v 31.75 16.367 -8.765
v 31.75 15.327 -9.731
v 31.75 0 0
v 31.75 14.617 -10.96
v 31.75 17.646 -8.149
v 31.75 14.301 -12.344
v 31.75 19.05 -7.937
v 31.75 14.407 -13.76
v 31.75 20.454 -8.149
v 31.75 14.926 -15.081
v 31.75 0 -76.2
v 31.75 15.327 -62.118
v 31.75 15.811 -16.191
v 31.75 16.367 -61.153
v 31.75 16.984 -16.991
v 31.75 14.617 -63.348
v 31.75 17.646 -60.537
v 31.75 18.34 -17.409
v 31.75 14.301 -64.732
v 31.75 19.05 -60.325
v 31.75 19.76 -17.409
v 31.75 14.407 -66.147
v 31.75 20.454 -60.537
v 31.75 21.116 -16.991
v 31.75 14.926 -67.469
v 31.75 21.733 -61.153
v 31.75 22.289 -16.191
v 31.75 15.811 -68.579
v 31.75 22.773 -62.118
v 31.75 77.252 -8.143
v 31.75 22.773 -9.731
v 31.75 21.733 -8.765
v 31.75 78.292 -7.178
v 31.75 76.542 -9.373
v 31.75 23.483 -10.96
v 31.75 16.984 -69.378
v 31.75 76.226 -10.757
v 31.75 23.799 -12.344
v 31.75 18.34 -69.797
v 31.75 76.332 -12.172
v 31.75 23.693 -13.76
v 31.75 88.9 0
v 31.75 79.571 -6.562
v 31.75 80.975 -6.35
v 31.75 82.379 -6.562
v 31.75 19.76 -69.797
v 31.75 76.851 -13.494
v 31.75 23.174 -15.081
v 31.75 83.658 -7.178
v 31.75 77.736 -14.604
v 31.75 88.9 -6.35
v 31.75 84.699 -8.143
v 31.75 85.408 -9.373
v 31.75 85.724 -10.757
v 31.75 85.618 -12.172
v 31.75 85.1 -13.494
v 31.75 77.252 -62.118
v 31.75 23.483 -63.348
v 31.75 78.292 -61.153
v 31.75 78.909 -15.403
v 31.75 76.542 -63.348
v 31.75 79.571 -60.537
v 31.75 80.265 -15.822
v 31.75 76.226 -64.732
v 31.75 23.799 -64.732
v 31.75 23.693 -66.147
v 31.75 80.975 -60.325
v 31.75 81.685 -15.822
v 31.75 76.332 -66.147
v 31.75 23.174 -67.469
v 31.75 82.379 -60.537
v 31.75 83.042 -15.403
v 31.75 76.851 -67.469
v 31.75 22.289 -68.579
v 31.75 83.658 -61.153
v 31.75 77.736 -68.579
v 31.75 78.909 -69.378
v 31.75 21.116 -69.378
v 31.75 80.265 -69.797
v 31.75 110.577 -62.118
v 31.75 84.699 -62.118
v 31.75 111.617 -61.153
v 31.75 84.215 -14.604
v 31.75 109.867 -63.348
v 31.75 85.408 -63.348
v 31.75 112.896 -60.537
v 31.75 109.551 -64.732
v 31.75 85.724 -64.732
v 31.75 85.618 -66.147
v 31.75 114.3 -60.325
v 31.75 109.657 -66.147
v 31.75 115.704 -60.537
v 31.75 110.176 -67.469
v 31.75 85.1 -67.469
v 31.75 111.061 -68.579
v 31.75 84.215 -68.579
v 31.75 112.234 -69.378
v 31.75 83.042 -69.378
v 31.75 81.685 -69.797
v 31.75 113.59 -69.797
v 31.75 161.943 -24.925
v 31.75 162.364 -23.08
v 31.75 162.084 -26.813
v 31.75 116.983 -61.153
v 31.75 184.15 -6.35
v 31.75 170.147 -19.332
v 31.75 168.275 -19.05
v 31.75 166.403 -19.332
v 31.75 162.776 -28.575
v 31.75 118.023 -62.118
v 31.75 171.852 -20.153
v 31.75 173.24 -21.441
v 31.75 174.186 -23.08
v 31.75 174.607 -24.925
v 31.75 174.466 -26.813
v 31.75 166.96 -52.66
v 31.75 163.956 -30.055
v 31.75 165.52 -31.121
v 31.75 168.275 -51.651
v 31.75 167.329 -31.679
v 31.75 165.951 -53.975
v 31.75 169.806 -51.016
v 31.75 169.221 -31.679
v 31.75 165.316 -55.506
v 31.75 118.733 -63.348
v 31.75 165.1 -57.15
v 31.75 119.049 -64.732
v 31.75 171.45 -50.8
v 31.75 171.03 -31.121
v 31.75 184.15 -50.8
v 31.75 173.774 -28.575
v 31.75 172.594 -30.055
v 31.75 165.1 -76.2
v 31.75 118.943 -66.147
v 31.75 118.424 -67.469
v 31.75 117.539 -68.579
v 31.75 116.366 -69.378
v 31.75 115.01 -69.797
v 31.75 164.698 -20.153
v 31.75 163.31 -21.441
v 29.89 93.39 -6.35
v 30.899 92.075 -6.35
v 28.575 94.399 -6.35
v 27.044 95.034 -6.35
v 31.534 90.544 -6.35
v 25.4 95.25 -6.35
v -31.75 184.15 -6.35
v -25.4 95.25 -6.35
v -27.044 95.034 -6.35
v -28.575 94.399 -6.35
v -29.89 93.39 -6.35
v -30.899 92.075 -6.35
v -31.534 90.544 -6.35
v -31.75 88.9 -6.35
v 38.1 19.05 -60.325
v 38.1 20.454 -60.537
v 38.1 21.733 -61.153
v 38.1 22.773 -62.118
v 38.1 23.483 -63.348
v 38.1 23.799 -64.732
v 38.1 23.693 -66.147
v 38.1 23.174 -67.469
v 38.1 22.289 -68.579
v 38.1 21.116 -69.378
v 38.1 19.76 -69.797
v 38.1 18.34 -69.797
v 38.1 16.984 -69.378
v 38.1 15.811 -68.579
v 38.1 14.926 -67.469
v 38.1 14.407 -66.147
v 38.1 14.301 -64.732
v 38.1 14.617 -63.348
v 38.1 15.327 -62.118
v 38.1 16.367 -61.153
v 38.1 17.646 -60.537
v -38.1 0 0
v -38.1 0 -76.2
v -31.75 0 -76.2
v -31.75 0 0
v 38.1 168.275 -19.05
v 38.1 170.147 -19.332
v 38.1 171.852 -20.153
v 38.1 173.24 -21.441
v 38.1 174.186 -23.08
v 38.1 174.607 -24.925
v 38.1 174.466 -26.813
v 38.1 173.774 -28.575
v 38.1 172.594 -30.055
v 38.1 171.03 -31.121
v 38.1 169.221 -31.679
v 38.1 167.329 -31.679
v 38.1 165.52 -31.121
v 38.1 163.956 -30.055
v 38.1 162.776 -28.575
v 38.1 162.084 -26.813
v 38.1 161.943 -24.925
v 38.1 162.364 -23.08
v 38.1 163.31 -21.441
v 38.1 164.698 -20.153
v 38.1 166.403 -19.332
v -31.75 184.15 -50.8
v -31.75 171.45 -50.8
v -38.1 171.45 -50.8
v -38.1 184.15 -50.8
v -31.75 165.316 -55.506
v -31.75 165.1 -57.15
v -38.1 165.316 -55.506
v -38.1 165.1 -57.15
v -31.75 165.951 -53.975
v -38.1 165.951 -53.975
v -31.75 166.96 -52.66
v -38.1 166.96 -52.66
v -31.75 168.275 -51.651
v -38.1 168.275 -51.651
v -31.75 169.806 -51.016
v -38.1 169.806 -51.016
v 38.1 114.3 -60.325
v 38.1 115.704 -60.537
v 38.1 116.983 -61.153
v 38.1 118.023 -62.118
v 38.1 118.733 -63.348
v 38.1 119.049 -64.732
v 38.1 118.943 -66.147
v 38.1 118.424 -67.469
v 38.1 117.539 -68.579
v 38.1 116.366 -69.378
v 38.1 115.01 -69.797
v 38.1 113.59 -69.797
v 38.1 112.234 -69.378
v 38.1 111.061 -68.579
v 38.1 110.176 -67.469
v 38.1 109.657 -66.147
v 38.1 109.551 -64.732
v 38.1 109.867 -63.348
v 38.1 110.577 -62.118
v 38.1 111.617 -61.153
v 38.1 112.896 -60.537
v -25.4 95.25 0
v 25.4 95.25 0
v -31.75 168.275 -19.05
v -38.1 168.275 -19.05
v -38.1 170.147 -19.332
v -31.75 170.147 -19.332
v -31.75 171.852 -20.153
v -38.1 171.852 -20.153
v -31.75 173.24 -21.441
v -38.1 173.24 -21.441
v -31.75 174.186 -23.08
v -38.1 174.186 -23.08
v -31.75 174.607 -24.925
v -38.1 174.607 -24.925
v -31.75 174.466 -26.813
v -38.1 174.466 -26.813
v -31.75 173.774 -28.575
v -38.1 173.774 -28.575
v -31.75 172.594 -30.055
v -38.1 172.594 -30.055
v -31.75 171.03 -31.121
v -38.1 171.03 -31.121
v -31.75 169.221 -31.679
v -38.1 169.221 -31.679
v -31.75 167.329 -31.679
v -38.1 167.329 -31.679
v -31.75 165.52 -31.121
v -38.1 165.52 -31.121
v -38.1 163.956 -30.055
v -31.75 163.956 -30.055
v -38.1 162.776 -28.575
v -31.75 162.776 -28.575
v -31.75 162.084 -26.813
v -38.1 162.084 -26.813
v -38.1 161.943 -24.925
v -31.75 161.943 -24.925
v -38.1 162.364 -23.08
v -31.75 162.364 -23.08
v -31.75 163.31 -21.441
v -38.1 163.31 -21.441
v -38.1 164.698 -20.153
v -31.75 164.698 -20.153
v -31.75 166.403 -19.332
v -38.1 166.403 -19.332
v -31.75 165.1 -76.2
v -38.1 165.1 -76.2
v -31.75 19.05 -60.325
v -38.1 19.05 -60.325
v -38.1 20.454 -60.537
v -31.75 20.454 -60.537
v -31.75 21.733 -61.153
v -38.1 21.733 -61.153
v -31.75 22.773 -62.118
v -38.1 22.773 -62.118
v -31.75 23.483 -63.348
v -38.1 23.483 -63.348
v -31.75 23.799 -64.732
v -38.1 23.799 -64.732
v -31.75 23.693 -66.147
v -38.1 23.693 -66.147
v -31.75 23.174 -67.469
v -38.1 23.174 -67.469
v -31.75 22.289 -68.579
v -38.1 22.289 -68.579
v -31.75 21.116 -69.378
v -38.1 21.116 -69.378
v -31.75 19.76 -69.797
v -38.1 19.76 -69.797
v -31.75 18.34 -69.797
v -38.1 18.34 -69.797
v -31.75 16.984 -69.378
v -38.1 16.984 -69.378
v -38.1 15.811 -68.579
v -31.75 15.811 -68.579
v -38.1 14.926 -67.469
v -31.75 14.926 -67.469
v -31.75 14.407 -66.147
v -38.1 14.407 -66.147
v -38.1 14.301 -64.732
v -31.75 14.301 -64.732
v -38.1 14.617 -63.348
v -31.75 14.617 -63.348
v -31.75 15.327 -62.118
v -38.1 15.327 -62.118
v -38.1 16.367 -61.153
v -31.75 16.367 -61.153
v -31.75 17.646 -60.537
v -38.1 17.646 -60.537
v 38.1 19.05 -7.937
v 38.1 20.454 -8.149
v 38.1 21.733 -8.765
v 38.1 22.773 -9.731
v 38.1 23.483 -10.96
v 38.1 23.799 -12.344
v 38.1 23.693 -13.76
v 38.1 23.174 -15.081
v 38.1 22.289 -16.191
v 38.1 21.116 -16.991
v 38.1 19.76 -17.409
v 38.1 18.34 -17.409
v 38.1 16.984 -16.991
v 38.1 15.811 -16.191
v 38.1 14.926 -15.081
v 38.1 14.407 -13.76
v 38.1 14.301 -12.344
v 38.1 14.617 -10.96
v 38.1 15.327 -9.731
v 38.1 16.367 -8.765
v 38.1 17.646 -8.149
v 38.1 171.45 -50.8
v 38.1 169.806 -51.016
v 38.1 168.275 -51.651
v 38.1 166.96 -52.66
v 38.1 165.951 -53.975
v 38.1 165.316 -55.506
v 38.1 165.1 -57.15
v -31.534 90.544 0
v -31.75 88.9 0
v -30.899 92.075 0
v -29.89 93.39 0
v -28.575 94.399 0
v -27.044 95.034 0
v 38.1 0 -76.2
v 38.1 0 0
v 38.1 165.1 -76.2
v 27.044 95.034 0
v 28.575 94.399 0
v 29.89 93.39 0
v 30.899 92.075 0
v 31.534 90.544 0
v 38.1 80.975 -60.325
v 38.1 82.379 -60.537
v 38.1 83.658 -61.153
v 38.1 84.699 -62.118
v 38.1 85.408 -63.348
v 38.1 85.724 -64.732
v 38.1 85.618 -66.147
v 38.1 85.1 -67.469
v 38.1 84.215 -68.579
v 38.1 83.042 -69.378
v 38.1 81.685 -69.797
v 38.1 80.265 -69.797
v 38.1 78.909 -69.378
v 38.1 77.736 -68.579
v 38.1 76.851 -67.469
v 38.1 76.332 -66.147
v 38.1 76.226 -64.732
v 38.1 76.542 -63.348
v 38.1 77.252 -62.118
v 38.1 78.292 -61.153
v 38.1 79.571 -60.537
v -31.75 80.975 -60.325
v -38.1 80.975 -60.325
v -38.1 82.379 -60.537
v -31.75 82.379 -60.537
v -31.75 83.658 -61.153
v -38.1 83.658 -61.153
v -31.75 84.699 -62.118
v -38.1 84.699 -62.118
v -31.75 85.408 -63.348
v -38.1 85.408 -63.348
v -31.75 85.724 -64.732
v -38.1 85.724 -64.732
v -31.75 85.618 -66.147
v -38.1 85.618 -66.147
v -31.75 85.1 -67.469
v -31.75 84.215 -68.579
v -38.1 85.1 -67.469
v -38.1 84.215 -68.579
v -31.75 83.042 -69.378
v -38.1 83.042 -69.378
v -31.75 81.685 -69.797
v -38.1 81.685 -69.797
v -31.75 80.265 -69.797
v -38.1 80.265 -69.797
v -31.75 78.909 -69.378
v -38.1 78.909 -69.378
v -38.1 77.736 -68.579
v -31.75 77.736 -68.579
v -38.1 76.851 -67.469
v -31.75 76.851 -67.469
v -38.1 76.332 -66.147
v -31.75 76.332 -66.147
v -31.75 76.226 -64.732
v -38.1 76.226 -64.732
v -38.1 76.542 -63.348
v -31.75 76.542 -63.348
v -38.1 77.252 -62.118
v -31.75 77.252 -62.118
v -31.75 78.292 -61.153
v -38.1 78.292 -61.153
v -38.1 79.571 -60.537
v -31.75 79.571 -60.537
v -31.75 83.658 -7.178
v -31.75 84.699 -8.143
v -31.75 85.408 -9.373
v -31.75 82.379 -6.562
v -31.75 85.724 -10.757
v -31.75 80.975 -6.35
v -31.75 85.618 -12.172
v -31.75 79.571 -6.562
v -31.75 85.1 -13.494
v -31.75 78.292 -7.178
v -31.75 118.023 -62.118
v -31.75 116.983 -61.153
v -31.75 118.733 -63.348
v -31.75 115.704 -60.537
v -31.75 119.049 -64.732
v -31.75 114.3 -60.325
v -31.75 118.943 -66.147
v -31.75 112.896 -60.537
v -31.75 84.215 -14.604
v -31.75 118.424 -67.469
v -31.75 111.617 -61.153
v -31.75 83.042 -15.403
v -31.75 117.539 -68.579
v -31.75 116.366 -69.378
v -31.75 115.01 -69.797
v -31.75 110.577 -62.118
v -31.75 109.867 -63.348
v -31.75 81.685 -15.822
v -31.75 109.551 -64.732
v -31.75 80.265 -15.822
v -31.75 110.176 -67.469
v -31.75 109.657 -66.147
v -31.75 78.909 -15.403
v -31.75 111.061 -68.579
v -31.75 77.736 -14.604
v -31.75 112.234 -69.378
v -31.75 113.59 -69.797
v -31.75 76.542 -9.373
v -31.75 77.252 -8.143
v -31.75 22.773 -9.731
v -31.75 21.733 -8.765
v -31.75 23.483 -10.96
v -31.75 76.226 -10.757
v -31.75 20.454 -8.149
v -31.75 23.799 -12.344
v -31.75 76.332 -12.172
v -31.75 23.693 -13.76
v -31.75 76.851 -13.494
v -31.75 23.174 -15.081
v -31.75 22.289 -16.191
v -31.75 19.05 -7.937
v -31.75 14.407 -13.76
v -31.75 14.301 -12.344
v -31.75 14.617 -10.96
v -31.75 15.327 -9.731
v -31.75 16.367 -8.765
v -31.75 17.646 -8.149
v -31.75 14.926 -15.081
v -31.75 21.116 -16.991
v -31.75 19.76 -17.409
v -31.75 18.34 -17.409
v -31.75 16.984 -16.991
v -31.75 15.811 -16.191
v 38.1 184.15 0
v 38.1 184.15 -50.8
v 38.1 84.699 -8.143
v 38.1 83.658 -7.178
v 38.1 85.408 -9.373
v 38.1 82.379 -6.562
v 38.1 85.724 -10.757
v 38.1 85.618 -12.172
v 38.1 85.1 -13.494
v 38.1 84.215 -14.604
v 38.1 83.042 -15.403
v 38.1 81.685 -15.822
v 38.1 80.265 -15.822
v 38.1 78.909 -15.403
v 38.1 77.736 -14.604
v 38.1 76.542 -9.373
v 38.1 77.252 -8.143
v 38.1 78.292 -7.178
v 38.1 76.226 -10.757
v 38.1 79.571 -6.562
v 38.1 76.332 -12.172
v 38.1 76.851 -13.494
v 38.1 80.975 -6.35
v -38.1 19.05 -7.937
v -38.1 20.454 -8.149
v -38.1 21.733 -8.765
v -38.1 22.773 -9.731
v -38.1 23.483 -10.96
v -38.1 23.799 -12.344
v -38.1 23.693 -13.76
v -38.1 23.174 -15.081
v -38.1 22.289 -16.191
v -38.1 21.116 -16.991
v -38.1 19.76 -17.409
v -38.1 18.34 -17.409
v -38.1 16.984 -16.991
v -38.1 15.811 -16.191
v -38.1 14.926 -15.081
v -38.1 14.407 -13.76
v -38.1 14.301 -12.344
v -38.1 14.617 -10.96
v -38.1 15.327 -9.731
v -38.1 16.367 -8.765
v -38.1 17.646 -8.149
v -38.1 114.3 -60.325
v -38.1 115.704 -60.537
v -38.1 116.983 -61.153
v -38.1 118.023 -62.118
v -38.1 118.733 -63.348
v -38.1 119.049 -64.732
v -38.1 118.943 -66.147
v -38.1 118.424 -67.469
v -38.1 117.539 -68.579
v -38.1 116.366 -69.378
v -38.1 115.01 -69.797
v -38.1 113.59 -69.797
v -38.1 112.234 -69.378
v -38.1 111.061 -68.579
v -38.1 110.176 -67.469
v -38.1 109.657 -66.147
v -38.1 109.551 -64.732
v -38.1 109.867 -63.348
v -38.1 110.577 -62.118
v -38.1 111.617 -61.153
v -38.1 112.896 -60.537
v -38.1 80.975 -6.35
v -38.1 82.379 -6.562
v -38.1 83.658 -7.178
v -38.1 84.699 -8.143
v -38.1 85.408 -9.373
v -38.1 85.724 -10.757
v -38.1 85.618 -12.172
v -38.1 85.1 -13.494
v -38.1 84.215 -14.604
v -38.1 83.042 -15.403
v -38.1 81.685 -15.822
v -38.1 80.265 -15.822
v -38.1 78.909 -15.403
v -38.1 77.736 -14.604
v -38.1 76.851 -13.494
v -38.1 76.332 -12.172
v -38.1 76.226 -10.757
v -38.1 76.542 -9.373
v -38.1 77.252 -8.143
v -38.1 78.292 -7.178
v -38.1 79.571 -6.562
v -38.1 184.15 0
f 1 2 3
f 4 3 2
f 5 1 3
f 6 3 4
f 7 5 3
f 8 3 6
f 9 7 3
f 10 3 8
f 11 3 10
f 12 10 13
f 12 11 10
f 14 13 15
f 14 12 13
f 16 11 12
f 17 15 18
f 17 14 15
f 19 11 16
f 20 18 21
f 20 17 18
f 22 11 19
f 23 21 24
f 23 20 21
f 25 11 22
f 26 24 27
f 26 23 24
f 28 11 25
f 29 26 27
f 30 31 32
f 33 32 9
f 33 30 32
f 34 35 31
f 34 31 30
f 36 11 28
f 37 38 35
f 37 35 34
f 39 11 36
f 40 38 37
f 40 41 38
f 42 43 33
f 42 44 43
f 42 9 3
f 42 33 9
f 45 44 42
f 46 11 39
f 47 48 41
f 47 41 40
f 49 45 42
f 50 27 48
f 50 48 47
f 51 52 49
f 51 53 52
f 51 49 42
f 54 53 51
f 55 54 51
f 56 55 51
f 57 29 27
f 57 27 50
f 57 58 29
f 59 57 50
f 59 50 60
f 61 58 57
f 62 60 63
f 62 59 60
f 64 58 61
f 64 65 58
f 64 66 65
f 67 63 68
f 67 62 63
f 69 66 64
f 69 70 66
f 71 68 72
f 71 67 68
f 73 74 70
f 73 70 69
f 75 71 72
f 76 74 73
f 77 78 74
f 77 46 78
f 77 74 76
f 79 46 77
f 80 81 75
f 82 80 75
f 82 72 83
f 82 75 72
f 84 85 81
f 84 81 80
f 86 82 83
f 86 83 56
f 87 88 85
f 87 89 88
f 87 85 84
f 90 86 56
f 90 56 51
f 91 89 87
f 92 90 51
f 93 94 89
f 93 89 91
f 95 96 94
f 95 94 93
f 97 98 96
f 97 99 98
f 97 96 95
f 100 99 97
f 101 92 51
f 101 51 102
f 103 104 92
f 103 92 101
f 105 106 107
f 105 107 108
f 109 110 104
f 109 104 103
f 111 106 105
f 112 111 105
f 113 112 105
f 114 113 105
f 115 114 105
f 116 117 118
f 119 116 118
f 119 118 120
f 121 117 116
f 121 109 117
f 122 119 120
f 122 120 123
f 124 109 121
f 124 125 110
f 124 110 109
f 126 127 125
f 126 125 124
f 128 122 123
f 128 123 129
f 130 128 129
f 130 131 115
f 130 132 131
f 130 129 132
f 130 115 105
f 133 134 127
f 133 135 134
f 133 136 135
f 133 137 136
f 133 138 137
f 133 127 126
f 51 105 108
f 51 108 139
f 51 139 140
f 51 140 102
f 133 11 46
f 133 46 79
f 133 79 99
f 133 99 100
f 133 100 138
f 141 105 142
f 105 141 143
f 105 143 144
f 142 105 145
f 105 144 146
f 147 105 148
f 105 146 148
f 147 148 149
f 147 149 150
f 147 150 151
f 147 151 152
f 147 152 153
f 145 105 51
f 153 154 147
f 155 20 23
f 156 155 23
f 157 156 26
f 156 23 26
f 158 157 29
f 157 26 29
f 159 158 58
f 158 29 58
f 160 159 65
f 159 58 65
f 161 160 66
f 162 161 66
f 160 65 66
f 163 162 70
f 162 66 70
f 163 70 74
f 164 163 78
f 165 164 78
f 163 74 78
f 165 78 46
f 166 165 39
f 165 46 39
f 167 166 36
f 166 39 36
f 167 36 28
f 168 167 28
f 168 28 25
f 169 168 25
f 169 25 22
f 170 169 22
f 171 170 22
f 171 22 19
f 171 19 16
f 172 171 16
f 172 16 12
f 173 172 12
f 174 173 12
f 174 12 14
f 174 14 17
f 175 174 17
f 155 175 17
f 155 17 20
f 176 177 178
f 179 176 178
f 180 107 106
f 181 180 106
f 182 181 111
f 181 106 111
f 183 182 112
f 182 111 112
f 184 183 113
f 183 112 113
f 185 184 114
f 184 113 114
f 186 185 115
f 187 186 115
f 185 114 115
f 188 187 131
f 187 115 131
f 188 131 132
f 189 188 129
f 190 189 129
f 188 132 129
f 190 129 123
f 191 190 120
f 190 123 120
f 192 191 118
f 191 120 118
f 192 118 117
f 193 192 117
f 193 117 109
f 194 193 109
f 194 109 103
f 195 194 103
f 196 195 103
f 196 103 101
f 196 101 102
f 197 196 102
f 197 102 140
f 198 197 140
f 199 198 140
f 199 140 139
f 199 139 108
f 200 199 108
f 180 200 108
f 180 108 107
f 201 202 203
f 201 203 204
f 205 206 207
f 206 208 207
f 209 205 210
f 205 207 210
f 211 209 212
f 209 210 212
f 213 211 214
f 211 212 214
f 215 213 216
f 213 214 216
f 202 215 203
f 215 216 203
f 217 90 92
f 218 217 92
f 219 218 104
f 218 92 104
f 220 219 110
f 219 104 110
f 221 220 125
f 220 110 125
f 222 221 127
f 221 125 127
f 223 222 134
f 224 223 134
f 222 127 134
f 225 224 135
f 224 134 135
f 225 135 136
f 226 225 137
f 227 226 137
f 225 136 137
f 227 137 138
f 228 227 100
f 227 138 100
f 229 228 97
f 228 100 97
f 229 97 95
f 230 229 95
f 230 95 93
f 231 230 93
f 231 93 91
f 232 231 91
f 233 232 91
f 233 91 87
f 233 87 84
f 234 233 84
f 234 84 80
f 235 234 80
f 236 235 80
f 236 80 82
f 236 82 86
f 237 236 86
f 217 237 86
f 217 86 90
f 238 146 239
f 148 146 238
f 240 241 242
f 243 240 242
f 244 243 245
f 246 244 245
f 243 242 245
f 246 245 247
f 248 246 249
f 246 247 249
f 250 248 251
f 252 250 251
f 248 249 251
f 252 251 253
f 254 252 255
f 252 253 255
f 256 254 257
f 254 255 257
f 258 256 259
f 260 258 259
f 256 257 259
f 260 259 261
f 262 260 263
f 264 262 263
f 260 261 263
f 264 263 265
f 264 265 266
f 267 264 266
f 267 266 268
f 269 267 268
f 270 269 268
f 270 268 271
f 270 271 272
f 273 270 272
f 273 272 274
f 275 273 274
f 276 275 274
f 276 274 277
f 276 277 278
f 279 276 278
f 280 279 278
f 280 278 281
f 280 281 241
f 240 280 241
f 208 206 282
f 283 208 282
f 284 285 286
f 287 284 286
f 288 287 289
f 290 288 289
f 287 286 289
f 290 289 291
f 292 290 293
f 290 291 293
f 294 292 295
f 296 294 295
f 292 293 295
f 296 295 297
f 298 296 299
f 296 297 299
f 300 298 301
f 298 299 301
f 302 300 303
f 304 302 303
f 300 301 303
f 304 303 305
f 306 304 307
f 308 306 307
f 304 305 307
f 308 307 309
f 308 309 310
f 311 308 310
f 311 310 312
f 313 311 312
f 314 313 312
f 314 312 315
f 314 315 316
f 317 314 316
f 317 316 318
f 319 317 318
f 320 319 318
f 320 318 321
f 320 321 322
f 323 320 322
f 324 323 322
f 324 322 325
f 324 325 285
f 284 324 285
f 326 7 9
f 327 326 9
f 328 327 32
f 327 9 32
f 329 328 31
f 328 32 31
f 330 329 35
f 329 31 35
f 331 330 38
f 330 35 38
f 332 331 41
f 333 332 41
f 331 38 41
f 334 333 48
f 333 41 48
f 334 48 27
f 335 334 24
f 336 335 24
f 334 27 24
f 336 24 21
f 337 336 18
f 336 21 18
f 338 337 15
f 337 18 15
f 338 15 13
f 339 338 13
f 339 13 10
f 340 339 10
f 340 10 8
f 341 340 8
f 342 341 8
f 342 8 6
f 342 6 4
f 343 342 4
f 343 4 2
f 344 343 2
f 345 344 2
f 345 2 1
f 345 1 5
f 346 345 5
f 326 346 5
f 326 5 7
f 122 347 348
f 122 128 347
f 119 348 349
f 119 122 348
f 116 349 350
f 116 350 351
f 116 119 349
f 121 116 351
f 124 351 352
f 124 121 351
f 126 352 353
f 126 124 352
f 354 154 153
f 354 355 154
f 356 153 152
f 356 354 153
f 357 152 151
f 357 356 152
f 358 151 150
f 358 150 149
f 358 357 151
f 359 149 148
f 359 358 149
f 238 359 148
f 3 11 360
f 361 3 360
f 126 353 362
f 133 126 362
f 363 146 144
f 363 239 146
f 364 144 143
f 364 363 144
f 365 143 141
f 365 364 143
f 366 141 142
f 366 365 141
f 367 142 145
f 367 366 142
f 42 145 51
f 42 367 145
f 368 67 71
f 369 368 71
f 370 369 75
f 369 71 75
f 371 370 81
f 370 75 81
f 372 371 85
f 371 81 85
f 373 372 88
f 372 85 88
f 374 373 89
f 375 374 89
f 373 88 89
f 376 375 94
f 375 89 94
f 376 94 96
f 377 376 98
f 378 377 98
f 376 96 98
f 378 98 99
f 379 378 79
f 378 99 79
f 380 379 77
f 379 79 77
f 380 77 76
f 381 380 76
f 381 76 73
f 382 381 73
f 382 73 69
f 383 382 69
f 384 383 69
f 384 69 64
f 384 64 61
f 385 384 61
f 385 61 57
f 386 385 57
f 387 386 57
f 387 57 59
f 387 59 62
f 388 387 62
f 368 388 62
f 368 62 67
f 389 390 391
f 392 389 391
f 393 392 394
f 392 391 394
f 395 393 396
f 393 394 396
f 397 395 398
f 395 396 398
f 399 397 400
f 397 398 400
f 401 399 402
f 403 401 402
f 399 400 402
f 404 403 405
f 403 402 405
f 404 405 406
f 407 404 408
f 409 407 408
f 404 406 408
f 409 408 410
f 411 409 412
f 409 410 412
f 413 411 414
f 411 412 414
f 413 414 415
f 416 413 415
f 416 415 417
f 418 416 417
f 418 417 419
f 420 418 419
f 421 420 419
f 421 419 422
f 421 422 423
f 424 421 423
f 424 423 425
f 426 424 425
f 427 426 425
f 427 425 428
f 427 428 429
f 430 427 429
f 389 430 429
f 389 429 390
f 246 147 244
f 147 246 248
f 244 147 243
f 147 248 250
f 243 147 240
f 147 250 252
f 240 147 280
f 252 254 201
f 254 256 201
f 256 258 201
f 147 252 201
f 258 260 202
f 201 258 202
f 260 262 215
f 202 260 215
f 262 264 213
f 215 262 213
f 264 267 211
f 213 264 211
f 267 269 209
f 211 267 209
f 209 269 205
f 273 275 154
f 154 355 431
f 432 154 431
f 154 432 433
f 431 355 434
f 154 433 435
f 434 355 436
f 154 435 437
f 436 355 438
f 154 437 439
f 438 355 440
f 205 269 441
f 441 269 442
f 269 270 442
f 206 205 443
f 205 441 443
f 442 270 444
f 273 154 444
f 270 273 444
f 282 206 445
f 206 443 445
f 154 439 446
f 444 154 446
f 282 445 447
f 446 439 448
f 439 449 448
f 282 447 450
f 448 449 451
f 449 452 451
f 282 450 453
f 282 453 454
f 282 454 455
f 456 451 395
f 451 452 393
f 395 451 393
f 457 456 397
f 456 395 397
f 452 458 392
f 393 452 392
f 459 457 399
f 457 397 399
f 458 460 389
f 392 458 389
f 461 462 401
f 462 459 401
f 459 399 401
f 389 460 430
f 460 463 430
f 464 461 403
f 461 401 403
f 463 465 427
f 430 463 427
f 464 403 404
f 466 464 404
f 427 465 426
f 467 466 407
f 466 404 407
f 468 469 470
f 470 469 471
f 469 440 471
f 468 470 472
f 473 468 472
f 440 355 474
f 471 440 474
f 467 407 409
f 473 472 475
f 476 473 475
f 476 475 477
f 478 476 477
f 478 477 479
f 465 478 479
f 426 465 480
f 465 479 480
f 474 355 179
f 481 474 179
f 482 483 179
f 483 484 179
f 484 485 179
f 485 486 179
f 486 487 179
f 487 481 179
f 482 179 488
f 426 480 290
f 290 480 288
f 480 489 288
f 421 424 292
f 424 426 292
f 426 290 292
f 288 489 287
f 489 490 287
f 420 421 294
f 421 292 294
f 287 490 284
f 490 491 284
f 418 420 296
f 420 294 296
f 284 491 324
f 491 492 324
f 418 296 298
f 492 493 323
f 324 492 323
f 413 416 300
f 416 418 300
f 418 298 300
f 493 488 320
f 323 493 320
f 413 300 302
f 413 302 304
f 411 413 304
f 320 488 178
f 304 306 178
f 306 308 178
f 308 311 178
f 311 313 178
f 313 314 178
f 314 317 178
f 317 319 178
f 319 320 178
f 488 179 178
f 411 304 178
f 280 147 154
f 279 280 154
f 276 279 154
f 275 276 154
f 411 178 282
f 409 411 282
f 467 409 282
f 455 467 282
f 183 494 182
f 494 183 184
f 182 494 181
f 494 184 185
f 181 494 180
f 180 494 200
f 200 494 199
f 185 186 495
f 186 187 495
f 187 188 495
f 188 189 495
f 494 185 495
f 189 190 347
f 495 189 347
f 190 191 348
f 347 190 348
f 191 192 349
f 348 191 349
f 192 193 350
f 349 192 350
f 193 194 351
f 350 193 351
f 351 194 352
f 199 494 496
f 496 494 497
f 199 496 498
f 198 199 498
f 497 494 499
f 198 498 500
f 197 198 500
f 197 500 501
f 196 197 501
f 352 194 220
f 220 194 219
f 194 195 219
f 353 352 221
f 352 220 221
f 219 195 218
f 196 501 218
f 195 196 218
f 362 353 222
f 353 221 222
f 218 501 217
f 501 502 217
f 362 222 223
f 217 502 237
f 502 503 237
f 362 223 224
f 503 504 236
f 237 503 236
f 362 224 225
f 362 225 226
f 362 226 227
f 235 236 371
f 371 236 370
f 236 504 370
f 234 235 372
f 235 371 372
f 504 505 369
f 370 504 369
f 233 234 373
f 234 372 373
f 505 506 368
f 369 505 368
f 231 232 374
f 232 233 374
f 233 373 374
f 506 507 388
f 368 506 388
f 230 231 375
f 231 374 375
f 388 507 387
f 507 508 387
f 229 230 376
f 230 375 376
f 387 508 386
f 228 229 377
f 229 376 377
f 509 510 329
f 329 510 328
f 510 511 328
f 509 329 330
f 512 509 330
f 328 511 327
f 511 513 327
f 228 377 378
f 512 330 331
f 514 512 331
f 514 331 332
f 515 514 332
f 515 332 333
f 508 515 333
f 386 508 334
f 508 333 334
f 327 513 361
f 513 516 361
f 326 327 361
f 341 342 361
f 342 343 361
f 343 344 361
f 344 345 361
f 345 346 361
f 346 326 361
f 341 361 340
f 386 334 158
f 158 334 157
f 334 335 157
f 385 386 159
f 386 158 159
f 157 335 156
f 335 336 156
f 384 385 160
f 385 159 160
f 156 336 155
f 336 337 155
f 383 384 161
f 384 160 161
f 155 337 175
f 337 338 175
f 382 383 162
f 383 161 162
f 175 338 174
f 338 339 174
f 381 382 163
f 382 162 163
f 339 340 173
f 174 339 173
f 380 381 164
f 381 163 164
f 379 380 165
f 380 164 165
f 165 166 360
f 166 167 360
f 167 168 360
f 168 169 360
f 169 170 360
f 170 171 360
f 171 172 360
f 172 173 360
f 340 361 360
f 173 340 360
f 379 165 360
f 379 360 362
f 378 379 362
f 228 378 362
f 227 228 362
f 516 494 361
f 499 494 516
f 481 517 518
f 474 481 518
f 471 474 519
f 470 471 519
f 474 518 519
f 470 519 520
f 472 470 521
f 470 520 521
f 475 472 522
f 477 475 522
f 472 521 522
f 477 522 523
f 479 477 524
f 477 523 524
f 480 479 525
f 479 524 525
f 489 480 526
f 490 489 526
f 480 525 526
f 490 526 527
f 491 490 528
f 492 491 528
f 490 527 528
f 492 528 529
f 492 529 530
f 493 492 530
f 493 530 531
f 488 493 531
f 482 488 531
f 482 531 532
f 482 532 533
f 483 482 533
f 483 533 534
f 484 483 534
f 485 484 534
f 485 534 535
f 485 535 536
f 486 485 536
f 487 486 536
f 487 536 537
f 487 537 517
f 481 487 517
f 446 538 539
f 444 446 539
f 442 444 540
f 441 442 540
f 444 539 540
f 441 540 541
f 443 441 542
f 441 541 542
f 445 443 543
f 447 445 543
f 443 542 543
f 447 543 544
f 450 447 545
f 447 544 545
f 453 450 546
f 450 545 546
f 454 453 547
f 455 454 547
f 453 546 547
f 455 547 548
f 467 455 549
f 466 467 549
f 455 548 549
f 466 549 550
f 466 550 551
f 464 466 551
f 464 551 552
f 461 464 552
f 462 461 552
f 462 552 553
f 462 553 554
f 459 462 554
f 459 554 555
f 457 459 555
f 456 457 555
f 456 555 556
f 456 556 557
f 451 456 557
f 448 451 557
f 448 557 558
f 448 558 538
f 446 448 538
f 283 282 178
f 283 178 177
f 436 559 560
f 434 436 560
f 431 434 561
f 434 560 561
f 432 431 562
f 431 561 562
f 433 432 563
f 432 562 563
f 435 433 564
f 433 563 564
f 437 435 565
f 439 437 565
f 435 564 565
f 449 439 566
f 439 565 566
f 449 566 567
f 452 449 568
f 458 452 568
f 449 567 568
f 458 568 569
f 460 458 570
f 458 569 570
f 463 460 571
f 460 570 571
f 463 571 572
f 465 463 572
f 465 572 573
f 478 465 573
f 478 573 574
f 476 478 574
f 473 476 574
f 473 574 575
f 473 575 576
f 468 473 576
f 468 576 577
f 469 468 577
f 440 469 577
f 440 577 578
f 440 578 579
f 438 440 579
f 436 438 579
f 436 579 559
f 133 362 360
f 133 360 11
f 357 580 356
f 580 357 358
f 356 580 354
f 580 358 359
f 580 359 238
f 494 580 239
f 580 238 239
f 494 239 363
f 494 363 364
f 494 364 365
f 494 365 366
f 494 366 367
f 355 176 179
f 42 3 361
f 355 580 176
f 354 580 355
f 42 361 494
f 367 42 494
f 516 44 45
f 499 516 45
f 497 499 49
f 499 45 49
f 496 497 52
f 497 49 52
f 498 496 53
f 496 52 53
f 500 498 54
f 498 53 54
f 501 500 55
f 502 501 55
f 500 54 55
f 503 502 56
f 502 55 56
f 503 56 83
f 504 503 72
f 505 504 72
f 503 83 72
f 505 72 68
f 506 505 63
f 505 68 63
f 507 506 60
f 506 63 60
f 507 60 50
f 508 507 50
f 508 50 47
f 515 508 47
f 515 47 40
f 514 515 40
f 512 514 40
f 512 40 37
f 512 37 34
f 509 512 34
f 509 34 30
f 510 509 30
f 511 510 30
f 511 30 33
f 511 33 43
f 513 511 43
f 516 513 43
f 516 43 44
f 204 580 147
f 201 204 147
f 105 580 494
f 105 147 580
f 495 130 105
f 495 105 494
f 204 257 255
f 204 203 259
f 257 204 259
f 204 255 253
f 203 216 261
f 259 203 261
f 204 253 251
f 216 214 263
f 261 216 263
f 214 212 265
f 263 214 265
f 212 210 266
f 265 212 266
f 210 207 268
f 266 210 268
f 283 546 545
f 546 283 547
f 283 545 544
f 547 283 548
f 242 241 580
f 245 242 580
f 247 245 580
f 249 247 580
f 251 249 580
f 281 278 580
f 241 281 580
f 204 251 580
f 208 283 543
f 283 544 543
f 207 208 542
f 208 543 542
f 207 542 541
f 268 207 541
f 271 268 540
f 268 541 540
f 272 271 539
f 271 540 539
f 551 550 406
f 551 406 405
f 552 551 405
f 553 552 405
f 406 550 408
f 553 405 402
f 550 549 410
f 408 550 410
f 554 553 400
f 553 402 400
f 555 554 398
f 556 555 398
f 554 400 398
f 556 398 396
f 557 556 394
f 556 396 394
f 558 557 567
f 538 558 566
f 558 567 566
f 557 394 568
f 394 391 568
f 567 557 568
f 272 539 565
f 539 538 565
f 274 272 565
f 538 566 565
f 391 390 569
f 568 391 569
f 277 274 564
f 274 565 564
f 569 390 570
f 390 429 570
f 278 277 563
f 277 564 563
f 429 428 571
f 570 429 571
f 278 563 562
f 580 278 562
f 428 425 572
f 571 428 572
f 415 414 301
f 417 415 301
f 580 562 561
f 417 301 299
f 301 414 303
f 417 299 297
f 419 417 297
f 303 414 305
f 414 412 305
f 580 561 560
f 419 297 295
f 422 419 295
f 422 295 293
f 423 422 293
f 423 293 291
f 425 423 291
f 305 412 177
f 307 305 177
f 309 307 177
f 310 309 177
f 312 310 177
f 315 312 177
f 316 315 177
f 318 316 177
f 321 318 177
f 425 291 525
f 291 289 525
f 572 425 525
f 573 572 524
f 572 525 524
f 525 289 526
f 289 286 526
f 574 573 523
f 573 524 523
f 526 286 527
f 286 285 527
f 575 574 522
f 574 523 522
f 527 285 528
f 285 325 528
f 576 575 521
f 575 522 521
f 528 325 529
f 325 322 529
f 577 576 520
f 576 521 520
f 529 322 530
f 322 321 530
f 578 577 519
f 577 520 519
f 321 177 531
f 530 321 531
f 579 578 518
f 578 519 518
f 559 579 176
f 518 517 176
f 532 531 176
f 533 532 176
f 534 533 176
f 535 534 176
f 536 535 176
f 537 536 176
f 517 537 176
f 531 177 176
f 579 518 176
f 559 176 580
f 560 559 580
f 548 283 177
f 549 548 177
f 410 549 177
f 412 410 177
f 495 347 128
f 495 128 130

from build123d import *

# Parameters (mm, degrees)
BOSS_EXTRUDE1_DEPTH                 = 184.15
SKETCH2_W                           = 63.5
SKETCH2_H                           = 95.25
CUT_EXTRUDE1_DEPTH                  = 201.603726286
F_3_8_0_375_CLEARANCE_DOWEL_HOLE1_D = 9.525
SKETCH6_W                           = 25.4
SKETCH6_H                           = 19.05
CUT_EXTRUDE2_DEPTH                  = 214.363779728
F_1_2_0_5_DIAMETER_HOLE1_D          = 12.7
FILLET1_R                           = 6.35
F_3_8_0_375_CLAMP_ADJUST_HOLE_D     = 9.525
F_3_8_0_375_CLAMP_ADJUST_HOLE_DEPTH = 82.55
F_3_8_0_375_CLAMP_ADJUST_HOLE_TIP   = 2.861598698


with BuildPart() as part:
    # Sketch1 → Boss-Extrude1 (new body)
    with BuildSketch(Plane(origin=(0, 0, 0), x_dir=(1, 0, 0), z_dir=(0, 1, 0))):
        Polygon((-38.1, 76.2), (-38.1, 0), (0, 0), (38.1, 0), (38.1, 76.2), (31.75, 76.2), (31.75, 6.35), (-31.75, 6.35), (-31.75, 76.2), align=None)
    extrude(amount=BOSS_EXTRUDE1_DEPTH)

    # Sketch2 → Cut-Extrude1 (cut, through all)
    with BuildSketch(Plane(origin=(0, 0, -6.35), x_dir=(-1, 0, 0), z_dir=(0, 0, -1))):
        with Locations((0, 47.625)):
            Rectangle(SKETCH2_W, SKETCH2_H)
    extrude(amount=-CUT_EXTRUDE1_DEPTH, mode=Mode.SUBTRACT)

    # 3/8 (0.375) Clearance Dowel Hole1 (through all)
    with Locations(Plane(origin=(38.1, 0, 0), x_dir=(0, 0, -1), z_dir=(1, 0, 0))):
        with Locations((65.0875, 19.05), (12.7, 19.05), (65.0875, 114.3)):
            Hole(F_3_8_0_375_CLEARANCE_DOWEL_HOLE1_D / 2)

    # Sketch6 → Cut-Extrude2 (cut, through all)
    with BuildSketch(Plane(origin=(38.1, 0, 0), x_dir=(0, 0, -1), z_dir=(1, 0, 0))):
        with Locations((63.5, 174.625)):
            Rectangle(SKETCH6_W, SKETCH6_H)
    extrude(amount=-CUT_EXTRUDE2_DEPTH, mode=Mode.SUBTRACT)

    # 1/2 (0.5) Diameter Hole1 (through all)
    with Locations(Plane(origin=(38.1, 0, 0), x_dir=(0, 0, -1), z_dir=(1, 0, 0))):
        with Locations((25.4, 168.275)):
            Hole(F_1_2_0_5_DIAMETER_HOLE1_D / 2)

    # Fillet1
    fillet1_edges = [part.edges().sort_by_distance(p)[0] for p in [
        (-31.75, 95.25, -3.175),
        (31.75, 95.25, -3.175),
        (34.925, 165.1, -50.8),
        (-34.925, 165.1, -50.8),
    ]]
    fillet(fillet1_edges, radius=FILLET1_R)

    # 3/8 (0.375) Clamp Adjust Hole
    with Locations(Plane(origin=(38.1, 0, 0), x_dir=(0, 0, -1), z_dir=(1, 0, 0))):
        with Locations((11.1125, 80.9752), (65.0875, 80.9752)):
            Hole(F_3_8_0_375_CLAMP_ADJUST_HOLE_D / 2, depth=F_3_8_0_375_CLAMP_ADJUST_HOLE_DEPTH)
            with Locations((0, 0, -(F_3_8_0_375_CLAMP_ADJUST_HOLE_DEPTH + F_3_8_0_375_CLAMP_ADJUST_HOLE_TIP / 2))):  # 118° drill point
                Cone(0, F_3_8_0_375_CLAMP_ADJUST_HOLE_D / 2, F_3_8_0_375_CLAMP_ADJUST_HOLE_TIP, mode=Mode.SUBTRACT)


solid = part.part
